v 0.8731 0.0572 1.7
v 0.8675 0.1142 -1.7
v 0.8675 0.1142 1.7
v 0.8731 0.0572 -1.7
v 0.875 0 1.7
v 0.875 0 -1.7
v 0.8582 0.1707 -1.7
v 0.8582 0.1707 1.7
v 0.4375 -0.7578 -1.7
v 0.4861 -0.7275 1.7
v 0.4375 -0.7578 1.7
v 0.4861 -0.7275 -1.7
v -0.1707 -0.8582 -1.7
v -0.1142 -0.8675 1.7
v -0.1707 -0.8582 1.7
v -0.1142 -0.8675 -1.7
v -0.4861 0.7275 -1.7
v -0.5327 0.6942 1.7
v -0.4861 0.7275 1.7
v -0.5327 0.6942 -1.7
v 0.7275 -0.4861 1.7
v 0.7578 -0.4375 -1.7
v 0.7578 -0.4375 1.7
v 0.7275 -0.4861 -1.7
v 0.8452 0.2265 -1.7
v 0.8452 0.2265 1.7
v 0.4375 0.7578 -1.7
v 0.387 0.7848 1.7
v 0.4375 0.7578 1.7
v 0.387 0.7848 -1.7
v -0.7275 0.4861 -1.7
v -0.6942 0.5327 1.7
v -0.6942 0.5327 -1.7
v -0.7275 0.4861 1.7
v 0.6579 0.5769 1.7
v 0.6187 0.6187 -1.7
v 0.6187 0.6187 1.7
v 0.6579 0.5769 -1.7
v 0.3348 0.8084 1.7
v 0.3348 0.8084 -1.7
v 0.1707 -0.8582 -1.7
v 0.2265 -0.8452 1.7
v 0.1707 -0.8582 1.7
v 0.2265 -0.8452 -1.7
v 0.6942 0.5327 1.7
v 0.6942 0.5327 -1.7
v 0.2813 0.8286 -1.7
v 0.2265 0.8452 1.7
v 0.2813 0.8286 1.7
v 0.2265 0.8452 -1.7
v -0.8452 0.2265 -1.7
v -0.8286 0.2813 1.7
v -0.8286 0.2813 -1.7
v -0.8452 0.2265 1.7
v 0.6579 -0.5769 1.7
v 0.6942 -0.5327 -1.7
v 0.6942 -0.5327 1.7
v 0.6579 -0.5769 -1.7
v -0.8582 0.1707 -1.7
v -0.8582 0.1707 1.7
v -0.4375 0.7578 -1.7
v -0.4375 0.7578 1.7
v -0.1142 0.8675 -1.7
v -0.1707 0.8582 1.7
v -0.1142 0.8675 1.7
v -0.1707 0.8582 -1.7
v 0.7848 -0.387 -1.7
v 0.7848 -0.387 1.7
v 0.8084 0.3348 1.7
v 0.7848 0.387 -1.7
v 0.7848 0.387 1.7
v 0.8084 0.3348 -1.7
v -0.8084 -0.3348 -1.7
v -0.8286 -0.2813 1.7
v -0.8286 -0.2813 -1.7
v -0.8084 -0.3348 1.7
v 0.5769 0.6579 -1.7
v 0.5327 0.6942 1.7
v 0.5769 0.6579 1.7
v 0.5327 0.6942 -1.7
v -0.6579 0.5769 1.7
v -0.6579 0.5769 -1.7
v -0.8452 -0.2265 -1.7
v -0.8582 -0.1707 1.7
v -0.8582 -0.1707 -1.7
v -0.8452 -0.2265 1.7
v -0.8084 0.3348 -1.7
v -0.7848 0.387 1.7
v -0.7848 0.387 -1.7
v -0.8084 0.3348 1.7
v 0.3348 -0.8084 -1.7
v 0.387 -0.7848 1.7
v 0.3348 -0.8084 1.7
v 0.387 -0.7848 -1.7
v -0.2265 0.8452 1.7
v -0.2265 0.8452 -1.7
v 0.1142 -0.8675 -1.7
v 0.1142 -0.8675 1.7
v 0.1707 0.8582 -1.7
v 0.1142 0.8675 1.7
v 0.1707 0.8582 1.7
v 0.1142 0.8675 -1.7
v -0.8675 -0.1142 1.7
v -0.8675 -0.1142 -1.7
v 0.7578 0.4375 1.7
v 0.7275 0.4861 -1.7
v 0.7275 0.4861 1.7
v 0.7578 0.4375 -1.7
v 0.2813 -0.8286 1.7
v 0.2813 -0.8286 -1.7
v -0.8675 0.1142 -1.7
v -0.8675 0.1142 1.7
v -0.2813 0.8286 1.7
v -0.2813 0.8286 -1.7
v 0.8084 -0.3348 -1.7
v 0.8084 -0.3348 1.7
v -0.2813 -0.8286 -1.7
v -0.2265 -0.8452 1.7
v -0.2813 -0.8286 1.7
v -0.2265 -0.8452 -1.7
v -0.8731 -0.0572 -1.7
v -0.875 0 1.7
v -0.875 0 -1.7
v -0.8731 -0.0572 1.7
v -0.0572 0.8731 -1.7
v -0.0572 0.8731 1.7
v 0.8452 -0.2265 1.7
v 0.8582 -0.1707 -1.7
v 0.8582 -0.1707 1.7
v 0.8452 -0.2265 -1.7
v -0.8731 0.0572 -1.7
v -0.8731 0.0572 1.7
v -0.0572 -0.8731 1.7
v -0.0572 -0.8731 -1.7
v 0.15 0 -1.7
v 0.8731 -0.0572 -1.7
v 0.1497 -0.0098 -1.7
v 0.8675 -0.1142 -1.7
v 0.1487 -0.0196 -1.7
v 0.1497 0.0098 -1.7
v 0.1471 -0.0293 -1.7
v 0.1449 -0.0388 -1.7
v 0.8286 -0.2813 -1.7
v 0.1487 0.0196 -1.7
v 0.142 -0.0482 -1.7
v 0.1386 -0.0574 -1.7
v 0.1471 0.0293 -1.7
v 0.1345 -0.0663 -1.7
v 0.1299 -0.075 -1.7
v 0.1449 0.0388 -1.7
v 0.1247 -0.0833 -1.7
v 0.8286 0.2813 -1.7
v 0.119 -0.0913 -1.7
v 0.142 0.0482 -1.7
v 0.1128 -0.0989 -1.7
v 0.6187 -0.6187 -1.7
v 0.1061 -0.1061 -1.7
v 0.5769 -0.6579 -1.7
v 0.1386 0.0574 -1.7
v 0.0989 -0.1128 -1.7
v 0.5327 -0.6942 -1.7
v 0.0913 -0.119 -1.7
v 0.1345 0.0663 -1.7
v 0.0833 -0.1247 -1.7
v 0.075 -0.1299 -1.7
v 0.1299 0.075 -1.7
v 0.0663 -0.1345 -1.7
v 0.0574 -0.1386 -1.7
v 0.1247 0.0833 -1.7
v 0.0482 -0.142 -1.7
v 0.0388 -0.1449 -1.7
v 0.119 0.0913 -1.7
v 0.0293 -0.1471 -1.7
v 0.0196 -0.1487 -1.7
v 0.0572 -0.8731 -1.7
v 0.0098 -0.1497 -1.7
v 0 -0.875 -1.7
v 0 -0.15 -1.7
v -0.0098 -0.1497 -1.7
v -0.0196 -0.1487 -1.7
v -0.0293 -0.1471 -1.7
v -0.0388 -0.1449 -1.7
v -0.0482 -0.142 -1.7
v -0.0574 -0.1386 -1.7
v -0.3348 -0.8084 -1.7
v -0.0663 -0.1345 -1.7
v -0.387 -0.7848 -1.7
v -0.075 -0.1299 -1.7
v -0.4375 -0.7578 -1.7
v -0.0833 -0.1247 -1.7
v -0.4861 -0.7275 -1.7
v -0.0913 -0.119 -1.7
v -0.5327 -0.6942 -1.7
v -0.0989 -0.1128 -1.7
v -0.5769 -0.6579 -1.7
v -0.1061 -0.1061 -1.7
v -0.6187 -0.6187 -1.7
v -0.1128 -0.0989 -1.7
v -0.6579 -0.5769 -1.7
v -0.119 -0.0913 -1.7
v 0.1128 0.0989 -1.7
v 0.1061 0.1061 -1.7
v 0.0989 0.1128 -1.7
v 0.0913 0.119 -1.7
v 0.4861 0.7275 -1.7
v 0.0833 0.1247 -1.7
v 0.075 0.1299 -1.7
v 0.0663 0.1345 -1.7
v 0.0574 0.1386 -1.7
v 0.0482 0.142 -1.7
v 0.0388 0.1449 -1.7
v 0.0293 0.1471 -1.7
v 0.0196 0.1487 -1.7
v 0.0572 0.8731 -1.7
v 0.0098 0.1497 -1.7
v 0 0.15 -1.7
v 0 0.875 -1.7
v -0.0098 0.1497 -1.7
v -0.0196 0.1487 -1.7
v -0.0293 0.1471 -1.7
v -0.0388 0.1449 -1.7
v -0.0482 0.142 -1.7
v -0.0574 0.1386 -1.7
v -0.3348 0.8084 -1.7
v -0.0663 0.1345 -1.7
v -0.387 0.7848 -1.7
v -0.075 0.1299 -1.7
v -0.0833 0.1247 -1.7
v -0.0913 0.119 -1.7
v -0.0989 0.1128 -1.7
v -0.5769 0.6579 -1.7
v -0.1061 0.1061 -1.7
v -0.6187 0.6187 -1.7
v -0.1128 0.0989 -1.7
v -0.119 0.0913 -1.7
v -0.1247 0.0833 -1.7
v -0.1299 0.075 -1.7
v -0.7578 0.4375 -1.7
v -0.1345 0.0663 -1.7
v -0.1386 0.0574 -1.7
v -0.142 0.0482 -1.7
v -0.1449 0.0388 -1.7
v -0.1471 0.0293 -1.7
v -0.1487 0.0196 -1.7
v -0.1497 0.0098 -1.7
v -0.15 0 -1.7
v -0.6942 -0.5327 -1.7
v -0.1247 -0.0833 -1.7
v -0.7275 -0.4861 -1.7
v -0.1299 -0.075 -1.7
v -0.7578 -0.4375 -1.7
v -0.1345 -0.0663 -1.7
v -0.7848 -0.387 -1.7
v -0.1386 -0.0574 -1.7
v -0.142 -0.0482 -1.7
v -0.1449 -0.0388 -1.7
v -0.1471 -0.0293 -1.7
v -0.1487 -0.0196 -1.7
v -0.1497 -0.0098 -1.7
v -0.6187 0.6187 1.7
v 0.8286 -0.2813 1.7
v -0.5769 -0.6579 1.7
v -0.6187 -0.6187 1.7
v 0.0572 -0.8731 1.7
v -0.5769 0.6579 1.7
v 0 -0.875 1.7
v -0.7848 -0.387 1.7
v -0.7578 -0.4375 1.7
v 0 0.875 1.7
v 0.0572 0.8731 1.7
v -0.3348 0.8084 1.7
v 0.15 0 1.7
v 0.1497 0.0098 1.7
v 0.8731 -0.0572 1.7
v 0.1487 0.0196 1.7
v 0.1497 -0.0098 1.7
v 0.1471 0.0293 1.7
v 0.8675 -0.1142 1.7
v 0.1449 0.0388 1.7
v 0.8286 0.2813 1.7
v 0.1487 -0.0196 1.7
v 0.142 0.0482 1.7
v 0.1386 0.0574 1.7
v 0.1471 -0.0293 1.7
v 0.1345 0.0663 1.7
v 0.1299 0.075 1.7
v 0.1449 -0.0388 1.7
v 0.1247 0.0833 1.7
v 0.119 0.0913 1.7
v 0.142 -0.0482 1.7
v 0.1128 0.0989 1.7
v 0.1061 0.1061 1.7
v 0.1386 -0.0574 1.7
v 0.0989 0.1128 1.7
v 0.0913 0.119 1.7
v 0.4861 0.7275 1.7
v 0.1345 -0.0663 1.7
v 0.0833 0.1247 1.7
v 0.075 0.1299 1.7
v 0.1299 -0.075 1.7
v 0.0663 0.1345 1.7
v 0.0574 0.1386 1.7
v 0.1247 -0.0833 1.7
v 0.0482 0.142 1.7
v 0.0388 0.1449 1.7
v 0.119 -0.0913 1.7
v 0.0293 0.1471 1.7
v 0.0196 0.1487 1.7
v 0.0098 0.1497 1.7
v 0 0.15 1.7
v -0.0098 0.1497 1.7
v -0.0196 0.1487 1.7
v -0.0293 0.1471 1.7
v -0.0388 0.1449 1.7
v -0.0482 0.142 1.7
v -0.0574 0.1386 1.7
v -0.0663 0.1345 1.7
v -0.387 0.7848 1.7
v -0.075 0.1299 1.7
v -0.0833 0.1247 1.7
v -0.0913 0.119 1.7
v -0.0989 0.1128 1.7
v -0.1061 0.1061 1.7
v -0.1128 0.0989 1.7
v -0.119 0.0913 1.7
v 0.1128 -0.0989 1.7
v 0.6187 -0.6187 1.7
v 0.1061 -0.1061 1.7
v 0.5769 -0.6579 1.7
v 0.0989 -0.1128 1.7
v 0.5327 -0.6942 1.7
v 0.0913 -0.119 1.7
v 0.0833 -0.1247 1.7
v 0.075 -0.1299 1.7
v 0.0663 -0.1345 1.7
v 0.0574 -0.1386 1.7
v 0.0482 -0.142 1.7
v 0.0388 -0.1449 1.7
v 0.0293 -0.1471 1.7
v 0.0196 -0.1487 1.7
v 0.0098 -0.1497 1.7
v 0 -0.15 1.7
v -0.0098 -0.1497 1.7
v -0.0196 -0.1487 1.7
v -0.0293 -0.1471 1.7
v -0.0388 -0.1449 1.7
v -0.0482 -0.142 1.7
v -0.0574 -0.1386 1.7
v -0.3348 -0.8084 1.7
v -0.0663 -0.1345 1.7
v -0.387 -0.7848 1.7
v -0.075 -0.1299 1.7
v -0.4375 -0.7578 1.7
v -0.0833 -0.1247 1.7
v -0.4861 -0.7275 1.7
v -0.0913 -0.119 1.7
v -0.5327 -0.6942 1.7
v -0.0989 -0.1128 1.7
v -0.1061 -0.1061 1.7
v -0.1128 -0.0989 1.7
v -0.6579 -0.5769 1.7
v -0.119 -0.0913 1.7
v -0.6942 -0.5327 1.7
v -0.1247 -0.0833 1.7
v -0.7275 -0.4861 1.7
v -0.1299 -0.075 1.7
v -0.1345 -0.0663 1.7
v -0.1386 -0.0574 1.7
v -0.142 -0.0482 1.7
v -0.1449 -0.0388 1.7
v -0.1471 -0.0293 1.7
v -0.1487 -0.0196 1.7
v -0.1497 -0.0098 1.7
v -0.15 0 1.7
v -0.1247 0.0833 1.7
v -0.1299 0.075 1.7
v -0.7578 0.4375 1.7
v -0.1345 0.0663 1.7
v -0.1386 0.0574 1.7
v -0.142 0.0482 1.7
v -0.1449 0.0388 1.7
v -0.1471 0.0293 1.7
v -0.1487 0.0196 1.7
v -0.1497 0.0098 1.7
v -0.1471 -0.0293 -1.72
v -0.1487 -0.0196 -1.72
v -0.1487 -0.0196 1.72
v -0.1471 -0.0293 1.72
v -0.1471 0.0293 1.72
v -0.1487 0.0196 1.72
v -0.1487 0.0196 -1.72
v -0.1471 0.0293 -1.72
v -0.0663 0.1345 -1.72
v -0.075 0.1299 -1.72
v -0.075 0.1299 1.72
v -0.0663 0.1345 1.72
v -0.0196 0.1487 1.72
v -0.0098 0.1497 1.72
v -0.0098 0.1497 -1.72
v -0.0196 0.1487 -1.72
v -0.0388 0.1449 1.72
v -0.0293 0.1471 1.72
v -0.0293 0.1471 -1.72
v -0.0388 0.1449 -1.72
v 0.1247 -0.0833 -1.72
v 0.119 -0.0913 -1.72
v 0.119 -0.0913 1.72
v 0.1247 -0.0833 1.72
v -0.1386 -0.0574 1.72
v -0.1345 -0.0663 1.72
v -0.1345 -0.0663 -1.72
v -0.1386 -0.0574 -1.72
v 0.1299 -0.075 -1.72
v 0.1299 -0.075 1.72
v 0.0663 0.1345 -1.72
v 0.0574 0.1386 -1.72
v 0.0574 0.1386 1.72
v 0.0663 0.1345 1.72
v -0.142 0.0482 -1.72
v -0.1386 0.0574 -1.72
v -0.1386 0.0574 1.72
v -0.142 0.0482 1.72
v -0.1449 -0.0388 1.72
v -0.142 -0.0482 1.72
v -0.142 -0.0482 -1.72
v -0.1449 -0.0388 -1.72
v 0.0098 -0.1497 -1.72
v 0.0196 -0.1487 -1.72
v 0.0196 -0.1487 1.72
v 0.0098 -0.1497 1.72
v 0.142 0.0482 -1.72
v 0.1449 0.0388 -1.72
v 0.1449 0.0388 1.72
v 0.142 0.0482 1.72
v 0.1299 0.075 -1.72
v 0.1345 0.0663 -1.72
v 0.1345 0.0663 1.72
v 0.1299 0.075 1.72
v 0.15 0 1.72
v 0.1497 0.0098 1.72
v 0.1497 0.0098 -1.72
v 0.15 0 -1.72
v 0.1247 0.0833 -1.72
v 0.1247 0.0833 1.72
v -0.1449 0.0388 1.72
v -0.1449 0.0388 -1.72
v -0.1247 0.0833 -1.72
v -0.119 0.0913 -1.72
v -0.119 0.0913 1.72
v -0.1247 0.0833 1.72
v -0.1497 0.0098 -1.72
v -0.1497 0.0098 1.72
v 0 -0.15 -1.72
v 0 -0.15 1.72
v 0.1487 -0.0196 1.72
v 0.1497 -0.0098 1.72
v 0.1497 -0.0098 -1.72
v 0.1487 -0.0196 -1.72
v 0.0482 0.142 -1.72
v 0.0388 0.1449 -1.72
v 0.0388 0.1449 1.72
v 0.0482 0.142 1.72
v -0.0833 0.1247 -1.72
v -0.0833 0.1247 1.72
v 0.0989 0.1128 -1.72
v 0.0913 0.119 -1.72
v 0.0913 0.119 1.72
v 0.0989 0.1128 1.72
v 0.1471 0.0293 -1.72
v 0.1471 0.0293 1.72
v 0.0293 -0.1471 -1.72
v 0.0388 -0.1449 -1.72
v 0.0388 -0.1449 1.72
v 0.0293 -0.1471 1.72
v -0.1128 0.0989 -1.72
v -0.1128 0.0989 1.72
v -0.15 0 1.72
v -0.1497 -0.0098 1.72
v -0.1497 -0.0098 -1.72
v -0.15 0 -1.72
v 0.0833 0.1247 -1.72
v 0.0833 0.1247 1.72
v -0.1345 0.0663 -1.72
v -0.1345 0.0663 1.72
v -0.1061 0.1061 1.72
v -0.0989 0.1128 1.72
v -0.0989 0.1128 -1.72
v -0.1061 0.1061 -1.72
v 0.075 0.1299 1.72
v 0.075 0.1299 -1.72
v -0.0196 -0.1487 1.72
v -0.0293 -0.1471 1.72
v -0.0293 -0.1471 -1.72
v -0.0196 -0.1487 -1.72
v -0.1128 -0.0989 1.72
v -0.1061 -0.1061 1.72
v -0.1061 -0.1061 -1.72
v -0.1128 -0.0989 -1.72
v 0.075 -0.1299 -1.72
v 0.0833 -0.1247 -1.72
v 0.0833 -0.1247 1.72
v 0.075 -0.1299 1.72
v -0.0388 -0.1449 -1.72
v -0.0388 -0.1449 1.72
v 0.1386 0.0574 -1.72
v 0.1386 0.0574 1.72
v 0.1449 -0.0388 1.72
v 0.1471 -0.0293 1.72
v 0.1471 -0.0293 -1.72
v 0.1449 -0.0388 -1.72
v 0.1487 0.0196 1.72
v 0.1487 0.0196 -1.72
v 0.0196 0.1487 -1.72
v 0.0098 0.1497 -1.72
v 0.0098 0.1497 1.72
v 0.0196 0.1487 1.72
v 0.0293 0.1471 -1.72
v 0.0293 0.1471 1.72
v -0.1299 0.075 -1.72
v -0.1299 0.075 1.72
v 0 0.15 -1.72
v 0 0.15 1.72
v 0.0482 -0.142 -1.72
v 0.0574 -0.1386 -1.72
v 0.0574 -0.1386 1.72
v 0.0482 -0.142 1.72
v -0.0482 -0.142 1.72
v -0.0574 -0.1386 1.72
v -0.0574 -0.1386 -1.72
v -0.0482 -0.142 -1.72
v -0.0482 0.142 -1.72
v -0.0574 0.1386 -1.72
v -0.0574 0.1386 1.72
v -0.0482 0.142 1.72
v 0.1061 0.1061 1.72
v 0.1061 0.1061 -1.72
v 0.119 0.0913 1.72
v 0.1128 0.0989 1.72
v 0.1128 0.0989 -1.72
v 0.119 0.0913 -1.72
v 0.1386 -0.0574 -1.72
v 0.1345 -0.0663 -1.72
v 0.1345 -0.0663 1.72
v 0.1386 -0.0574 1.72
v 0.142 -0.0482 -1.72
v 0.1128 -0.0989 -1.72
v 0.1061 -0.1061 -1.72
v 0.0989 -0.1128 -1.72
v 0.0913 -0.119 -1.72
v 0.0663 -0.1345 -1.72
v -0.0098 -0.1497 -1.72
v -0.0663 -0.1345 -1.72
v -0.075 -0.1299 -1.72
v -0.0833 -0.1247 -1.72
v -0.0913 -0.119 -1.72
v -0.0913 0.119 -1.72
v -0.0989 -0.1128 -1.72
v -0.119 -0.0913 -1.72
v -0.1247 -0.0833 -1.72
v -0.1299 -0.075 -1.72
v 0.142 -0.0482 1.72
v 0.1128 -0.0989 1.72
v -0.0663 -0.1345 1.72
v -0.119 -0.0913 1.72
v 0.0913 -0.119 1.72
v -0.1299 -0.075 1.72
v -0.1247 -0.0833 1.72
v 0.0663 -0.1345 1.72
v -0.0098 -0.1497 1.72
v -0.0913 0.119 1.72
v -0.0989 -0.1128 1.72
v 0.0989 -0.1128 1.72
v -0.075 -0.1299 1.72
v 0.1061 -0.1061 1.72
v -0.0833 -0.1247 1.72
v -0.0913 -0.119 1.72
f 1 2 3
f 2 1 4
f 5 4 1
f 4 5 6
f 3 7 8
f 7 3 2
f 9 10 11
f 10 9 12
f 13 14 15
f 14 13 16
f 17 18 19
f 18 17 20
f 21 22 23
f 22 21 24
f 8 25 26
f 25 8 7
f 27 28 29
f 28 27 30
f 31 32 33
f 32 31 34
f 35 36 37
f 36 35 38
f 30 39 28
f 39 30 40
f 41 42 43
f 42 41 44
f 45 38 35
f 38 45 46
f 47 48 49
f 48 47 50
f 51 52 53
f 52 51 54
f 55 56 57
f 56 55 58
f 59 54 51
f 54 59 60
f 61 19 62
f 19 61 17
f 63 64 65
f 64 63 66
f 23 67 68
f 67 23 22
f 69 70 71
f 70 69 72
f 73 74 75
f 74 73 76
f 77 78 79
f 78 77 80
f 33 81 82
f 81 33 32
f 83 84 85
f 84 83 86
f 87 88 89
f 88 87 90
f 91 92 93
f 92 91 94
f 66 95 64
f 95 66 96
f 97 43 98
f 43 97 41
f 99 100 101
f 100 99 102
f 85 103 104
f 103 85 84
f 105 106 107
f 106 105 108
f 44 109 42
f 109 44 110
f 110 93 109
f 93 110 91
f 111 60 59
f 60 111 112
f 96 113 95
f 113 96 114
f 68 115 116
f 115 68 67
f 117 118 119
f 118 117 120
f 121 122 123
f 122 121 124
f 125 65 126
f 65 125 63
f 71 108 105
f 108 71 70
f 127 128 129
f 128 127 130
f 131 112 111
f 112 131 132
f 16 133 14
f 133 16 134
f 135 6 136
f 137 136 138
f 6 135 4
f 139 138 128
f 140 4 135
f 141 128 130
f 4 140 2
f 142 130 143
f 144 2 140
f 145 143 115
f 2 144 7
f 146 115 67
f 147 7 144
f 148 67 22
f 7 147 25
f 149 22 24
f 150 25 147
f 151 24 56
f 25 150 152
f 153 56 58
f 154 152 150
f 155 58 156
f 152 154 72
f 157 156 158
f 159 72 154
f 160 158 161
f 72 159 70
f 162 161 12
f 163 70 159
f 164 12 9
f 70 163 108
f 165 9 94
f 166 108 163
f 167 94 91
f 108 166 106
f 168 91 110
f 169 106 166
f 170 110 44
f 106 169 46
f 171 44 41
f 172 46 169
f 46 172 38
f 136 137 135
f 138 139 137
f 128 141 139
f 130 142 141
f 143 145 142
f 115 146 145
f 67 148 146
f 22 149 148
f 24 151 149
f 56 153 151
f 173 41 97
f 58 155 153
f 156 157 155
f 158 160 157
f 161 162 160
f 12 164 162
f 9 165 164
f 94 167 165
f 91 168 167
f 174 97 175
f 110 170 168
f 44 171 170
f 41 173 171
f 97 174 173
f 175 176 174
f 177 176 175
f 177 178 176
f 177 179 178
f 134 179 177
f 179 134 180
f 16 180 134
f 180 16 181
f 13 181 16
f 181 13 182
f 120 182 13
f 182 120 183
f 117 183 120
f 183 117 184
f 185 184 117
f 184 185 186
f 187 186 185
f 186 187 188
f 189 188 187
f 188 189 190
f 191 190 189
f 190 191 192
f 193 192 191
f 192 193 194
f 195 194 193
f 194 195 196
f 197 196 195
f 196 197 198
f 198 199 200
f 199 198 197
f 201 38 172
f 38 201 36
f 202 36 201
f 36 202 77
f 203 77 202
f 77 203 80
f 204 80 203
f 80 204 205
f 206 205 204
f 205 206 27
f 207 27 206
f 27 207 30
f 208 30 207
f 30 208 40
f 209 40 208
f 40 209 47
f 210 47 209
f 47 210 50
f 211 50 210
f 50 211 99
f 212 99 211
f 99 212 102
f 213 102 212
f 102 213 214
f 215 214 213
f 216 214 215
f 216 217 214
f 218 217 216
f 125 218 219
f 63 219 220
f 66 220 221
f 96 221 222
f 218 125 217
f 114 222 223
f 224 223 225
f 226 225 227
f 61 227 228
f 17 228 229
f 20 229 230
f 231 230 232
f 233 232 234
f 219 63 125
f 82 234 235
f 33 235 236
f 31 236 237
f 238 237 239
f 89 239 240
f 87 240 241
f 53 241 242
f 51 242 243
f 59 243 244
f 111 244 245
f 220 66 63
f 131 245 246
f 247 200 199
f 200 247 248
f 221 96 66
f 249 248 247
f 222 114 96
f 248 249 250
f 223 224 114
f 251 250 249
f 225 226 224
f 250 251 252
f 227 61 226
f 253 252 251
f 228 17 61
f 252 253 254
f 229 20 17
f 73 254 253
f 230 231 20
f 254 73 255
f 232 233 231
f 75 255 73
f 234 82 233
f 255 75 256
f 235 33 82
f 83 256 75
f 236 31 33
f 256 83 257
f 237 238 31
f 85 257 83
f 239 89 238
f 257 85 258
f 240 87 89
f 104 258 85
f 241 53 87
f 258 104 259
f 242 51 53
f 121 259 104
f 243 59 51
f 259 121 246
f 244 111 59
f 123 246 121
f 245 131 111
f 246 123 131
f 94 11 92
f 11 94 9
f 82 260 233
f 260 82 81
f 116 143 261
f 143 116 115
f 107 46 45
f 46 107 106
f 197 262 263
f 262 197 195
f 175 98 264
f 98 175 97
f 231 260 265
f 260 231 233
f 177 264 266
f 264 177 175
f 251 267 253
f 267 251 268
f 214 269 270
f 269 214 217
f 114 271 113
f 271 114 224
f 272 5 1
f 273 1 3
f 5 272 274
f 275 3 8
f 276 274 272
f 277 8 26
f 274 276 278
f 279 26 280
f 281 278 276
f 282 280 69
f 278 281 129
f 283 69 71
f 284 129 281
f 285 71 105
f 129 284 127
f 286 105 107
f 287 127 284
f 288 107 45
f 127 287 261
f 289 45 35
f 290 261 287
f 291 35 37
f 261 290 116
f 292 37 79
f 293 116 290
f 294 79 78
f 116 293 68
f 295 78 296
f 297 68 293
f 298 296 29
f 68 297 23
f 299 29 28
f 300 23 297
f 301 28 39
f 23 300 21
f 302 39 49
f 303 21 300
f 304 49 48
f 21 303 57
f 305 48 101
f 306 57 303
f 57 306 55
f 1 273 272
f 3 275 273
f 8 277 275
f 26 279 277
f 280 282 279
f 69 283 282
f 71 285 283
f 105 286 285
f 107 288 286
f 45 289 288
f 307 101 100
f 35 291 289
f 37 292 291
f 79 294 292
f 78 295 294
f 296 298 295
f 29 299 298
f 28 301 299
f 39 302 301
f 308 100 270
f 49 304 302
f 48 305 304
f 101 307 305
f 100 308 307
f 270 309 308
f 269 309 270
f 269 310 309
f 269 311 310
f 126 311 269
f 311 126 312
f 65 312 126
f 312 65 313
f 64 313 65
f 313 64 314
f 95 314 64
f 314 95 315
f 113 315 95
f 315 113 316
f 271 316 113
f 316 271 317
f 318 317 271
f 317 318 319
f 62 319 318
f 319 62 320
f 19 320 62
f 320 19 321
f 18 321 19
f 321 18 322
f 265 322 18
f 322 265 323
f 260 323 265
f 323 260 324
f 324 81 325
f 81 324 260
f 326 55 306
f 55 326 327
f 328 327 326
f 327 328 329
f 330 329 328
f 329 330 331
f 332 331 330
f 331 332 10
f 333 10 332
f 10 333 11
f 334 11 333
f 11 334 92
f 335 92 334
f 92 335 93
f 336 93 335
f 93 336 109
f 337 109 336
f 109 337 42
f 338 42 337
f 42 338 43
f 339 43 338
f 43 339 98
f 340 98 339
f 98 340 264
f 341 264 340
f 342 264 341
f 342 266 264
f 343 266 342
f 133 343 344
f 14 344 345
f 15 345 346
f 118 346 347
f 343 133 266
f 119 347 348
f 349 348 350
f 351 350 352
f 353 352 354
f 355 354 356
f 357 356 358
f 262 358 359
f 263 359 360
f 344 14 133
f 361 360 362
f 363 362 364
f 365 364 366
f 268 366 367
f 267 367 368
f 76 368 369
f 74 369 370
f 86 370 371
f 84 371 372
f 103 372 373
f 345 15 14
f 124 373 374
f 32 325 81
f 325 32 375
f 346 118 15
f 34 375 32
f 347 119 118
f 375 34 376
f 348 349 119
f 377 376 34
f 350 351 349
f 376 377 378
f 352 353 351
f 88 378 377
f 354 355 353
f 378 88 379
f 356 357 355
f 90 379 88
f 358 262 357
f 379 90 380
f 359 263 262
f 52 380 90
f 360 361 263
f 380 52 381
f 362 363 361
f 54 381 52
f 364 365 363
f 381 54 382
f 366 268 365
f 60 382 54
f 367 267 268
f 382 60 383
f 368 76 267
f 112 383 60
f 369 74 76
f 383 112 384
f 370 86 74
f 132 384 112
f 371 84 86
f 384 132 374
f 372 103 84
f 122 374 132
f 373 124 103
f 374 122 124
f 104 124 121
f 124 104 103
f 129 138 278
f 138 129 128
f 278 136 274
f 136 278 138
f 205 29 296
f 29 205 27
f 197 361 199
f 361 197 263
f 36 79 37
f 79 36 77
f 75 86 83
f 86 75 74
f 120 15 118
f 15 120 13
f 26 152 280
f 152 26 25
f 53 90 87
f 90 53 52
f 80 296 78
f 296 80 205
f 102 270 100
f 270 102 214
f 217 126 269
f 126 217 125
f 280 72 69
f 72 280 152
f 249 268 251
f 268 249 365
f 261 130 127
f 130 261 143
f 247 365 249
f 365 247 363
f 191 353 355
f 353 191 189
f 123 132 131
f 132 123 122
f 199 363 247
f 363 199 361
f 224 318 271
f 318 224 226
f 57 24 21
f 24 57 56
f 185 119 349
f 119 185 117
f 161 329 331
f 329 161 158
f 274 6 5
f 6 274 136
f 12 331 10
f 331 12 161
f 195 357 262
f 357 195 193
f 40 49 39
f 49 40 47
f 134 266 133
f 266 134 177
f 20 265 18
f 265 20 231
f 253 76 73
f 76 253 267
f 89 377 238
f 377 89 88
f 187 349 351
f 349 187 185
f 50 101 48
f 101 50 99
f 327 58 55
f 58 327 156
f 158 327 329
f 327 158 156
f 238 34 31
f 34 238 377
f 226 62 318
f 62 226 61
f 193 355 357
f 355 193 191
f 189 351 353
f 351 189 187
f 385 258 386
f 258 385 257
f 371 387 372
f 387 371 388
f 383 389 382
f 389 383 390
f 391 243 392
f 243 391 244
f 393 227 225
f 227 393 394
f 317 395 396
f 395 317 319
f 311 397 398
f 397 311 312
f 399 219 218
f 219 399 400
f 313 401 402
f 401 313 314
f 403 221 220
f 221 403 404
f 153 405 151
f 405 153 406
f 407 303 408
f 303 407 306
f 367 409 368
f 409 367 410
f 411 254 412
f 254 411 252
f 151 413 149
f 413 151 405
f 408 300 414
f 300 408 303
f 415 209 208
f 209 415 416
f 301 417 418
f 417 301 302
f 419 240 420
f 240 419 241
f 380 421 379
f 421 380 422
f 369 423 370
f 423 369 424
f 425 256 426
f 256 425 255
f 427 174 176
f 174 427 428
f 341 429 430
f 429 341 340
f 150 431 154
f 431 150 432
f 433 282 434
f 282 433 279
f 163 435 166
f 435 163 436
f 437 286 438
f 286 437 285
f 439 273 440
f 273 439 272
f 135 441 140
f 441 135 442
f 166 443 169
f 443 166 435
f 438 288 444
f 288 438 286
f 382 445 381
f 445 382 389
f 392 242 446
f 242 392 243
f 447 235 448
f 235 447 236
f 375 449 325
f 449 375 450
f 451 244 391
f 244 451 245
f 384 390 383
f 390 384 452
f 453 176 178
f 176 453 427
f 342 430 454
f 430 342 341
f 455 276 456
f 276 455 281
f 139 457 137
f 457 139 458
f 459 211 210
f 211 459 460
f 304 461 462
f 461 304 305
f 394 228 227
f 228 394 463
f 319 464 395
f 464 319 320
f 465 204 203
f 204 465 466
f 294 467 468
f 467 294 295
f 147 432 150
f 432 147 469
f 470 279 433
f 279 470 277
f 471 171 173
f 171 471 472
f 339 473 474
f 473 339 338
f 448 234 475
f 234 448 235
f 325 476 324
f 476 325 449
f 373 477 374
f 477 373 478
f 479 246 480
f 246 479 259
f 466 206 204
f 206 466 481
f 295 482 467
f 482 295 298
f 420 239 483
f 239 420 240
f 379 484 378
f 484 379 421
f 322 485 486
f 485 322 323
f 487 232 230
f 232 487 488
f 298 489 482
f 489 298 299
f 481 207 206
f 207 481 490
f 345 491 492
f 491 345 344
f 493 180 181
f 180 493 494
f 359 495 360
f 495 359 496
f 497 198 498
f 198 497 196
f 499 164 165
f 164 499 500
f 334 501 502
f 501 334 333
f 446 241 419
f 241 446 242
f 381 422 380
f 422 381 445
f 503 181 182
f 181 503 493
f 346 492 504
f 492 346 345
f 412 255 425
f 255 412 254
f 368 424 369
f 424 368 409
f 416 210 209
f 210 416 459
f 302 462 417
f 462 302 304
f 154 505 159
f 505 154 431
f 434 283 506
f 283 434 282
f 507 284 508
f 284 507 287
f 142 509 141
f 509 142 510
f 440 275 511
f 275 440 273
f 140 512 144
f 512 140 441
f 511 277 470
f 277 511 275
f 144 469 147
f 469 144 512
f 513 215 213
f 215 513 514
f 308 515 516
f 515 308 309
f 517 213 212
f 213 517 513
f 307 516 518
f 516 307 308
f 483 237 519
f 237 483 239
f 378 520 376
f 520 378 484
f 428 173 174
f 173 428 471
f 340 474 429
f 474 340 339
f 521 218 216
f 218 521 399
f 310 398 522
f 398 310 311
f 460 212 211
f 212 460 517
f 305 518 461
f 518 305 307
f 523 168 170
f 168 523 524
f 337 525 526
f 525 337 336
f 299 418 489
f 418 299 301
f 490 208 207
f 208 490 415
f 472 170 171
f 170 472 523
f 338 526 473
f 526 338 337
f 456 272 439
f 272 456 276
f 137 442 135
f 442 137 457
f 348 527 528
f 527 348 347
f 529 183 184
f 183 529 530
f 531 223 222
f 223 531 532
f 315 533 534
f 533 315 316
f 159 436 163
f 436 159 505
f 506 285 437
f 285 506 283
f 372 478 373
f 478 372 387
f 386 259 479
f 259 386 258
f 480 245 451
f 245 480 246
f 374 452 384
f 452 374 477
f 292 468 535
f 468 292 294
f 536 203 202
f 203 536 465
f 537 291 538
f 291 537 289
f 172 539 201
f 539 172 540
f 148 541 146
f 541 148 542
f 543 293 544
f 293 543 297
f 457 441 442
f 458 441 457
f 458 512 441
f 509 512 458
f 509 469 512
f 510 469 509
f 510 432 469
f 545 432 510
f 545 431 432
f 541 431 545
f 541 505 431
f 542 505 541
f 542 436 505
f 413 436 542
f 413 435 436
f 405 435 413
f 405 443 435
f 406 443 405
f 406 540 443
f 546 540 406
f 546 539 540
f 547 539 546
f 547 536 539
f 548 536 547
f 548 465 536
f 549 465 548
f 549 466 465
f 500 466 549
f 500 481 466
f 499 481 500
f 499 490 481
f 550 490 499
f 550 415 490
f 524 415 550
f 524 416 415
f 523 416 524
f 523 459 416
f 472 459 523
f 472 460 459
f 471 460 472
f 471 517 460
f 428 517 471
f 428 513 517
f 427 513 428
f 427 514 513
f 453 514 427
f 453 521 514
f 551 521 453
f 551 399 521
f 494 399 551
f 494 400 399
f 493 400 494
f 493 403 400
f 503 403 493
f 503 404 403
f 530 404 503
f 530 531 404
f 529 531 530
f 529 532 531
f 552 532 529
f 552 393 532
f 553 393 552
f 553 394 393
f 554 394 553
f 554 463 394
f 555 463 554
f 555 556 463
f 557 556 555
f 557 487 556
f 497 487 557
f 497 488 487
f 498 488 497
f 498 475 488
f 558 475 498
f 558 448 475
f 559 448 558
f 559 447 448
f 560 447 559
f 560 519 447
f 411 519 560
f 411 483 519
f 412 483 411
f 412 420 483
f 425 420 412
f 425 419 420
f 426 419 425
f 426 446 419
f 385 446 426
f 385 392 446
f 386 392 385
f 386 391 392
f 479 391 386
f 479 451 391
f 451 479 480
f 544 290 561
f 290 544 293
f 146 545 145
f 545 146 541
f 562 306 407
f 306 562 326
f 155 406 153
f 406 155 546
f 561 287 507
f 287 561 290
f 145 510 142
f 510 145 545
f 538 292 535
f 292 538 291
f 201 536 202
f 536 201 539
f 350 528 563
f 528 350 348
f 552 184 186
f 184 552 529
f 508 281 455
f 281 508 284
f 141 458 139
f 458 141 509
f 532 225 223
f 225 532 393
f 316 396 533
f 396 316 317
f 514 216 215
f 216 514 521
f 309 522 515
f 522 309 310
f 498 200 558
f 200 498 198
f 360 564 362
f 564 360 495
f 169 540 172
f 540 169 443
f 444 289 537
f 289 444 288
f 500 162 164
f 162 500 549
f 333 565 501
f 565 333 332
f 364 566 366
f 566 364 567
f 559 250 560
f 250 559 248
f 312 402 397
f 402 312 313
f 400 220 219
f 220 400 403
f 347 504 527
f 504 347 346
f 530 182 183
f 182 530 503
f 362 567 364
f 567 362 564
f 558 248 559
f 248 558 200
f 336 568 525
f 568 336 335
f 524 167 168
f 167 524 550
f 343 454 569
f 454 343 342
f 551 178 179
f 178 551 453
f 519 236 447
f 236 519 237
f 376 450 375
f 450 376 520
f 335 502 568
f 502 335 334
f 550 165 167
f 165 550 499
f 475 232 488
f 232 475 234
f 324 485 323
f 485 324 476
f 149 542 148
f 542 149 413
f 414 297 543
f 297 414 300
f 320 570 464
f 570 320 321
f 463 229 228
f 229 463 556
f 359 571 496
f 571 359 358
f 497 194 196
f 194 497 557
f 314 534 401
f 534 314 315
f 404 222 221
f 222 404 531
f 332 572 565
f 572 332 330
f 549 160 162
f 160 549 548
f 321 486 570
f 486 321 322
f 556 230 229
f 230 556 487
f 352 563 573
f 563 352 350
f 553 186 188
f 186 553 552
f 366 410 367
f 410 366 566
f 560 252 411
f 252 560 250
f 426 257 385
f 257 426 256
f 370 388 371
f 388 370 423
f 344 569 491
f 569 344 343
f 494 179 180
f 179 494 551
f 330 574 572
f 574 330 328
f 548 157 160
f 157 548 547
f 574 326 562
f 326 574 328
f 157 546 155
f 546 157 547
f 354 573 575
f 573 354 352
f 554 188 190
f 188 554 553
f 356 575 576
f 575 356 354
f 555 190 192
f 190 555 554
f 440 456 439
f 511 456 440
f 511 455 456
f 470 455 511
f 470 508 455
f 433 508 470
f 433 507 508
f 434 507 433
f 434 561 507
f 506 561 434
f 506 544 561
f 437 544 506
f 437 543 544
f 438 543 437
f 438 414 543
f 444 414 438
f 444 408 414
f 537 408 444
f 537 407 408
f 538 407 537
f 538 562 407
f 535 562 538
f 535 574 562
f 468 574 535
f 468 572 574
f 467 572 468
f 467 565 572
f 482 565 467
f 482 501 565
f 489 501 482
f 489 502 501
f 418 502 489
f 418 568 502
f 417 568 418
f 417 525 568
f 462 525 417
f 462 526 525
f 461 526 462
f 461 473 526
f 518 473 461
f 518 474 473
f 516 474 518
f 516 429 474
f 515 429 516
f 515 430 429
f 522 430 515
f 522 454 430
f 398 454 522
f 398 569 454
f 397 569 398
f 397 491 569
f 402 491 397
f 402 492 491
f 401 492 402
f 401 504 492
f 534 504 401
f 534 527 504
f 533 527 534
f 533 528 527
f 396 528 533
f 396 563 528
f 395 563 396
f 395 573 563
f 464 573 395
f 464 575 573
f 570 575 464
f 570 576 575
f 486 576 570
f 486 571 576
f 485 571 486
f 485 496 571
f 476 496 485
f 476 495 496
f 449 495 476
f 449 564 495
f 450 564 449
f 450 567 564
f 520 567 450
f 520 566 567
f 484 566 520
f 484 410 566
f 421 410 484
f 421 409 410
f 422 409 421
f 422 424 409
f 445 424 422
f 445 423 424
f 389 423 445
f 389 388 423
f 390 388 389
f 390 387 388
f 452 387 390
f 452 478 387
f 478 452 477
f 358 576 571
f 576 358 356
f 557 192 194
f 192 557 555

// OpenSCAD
// Axial part target dimensions: [3.4, 1.75, 0.3]
// Interpreted as: body length (axial) = 3.4, body diameter = 1.75, lead diameter = 0.3

$fn = 96;

L = 3.4;        // axial length
D = 1.75;       // body diameter
lead_d = 0.3;   // lead diameter

eps = 0.02;

module axial_part() {
    union() {
        // Main cylindrical body (axial component)
        cylinder(h=L, r=D/2, center=true);

        // Leads (extend slightly beyond body; connected with small overlap)
        translate([0, 0, 0])
            cylinder(h=L + 2*eps, r=lead_d/2, center=true);
    }
}

color("Silver") axial_part();
